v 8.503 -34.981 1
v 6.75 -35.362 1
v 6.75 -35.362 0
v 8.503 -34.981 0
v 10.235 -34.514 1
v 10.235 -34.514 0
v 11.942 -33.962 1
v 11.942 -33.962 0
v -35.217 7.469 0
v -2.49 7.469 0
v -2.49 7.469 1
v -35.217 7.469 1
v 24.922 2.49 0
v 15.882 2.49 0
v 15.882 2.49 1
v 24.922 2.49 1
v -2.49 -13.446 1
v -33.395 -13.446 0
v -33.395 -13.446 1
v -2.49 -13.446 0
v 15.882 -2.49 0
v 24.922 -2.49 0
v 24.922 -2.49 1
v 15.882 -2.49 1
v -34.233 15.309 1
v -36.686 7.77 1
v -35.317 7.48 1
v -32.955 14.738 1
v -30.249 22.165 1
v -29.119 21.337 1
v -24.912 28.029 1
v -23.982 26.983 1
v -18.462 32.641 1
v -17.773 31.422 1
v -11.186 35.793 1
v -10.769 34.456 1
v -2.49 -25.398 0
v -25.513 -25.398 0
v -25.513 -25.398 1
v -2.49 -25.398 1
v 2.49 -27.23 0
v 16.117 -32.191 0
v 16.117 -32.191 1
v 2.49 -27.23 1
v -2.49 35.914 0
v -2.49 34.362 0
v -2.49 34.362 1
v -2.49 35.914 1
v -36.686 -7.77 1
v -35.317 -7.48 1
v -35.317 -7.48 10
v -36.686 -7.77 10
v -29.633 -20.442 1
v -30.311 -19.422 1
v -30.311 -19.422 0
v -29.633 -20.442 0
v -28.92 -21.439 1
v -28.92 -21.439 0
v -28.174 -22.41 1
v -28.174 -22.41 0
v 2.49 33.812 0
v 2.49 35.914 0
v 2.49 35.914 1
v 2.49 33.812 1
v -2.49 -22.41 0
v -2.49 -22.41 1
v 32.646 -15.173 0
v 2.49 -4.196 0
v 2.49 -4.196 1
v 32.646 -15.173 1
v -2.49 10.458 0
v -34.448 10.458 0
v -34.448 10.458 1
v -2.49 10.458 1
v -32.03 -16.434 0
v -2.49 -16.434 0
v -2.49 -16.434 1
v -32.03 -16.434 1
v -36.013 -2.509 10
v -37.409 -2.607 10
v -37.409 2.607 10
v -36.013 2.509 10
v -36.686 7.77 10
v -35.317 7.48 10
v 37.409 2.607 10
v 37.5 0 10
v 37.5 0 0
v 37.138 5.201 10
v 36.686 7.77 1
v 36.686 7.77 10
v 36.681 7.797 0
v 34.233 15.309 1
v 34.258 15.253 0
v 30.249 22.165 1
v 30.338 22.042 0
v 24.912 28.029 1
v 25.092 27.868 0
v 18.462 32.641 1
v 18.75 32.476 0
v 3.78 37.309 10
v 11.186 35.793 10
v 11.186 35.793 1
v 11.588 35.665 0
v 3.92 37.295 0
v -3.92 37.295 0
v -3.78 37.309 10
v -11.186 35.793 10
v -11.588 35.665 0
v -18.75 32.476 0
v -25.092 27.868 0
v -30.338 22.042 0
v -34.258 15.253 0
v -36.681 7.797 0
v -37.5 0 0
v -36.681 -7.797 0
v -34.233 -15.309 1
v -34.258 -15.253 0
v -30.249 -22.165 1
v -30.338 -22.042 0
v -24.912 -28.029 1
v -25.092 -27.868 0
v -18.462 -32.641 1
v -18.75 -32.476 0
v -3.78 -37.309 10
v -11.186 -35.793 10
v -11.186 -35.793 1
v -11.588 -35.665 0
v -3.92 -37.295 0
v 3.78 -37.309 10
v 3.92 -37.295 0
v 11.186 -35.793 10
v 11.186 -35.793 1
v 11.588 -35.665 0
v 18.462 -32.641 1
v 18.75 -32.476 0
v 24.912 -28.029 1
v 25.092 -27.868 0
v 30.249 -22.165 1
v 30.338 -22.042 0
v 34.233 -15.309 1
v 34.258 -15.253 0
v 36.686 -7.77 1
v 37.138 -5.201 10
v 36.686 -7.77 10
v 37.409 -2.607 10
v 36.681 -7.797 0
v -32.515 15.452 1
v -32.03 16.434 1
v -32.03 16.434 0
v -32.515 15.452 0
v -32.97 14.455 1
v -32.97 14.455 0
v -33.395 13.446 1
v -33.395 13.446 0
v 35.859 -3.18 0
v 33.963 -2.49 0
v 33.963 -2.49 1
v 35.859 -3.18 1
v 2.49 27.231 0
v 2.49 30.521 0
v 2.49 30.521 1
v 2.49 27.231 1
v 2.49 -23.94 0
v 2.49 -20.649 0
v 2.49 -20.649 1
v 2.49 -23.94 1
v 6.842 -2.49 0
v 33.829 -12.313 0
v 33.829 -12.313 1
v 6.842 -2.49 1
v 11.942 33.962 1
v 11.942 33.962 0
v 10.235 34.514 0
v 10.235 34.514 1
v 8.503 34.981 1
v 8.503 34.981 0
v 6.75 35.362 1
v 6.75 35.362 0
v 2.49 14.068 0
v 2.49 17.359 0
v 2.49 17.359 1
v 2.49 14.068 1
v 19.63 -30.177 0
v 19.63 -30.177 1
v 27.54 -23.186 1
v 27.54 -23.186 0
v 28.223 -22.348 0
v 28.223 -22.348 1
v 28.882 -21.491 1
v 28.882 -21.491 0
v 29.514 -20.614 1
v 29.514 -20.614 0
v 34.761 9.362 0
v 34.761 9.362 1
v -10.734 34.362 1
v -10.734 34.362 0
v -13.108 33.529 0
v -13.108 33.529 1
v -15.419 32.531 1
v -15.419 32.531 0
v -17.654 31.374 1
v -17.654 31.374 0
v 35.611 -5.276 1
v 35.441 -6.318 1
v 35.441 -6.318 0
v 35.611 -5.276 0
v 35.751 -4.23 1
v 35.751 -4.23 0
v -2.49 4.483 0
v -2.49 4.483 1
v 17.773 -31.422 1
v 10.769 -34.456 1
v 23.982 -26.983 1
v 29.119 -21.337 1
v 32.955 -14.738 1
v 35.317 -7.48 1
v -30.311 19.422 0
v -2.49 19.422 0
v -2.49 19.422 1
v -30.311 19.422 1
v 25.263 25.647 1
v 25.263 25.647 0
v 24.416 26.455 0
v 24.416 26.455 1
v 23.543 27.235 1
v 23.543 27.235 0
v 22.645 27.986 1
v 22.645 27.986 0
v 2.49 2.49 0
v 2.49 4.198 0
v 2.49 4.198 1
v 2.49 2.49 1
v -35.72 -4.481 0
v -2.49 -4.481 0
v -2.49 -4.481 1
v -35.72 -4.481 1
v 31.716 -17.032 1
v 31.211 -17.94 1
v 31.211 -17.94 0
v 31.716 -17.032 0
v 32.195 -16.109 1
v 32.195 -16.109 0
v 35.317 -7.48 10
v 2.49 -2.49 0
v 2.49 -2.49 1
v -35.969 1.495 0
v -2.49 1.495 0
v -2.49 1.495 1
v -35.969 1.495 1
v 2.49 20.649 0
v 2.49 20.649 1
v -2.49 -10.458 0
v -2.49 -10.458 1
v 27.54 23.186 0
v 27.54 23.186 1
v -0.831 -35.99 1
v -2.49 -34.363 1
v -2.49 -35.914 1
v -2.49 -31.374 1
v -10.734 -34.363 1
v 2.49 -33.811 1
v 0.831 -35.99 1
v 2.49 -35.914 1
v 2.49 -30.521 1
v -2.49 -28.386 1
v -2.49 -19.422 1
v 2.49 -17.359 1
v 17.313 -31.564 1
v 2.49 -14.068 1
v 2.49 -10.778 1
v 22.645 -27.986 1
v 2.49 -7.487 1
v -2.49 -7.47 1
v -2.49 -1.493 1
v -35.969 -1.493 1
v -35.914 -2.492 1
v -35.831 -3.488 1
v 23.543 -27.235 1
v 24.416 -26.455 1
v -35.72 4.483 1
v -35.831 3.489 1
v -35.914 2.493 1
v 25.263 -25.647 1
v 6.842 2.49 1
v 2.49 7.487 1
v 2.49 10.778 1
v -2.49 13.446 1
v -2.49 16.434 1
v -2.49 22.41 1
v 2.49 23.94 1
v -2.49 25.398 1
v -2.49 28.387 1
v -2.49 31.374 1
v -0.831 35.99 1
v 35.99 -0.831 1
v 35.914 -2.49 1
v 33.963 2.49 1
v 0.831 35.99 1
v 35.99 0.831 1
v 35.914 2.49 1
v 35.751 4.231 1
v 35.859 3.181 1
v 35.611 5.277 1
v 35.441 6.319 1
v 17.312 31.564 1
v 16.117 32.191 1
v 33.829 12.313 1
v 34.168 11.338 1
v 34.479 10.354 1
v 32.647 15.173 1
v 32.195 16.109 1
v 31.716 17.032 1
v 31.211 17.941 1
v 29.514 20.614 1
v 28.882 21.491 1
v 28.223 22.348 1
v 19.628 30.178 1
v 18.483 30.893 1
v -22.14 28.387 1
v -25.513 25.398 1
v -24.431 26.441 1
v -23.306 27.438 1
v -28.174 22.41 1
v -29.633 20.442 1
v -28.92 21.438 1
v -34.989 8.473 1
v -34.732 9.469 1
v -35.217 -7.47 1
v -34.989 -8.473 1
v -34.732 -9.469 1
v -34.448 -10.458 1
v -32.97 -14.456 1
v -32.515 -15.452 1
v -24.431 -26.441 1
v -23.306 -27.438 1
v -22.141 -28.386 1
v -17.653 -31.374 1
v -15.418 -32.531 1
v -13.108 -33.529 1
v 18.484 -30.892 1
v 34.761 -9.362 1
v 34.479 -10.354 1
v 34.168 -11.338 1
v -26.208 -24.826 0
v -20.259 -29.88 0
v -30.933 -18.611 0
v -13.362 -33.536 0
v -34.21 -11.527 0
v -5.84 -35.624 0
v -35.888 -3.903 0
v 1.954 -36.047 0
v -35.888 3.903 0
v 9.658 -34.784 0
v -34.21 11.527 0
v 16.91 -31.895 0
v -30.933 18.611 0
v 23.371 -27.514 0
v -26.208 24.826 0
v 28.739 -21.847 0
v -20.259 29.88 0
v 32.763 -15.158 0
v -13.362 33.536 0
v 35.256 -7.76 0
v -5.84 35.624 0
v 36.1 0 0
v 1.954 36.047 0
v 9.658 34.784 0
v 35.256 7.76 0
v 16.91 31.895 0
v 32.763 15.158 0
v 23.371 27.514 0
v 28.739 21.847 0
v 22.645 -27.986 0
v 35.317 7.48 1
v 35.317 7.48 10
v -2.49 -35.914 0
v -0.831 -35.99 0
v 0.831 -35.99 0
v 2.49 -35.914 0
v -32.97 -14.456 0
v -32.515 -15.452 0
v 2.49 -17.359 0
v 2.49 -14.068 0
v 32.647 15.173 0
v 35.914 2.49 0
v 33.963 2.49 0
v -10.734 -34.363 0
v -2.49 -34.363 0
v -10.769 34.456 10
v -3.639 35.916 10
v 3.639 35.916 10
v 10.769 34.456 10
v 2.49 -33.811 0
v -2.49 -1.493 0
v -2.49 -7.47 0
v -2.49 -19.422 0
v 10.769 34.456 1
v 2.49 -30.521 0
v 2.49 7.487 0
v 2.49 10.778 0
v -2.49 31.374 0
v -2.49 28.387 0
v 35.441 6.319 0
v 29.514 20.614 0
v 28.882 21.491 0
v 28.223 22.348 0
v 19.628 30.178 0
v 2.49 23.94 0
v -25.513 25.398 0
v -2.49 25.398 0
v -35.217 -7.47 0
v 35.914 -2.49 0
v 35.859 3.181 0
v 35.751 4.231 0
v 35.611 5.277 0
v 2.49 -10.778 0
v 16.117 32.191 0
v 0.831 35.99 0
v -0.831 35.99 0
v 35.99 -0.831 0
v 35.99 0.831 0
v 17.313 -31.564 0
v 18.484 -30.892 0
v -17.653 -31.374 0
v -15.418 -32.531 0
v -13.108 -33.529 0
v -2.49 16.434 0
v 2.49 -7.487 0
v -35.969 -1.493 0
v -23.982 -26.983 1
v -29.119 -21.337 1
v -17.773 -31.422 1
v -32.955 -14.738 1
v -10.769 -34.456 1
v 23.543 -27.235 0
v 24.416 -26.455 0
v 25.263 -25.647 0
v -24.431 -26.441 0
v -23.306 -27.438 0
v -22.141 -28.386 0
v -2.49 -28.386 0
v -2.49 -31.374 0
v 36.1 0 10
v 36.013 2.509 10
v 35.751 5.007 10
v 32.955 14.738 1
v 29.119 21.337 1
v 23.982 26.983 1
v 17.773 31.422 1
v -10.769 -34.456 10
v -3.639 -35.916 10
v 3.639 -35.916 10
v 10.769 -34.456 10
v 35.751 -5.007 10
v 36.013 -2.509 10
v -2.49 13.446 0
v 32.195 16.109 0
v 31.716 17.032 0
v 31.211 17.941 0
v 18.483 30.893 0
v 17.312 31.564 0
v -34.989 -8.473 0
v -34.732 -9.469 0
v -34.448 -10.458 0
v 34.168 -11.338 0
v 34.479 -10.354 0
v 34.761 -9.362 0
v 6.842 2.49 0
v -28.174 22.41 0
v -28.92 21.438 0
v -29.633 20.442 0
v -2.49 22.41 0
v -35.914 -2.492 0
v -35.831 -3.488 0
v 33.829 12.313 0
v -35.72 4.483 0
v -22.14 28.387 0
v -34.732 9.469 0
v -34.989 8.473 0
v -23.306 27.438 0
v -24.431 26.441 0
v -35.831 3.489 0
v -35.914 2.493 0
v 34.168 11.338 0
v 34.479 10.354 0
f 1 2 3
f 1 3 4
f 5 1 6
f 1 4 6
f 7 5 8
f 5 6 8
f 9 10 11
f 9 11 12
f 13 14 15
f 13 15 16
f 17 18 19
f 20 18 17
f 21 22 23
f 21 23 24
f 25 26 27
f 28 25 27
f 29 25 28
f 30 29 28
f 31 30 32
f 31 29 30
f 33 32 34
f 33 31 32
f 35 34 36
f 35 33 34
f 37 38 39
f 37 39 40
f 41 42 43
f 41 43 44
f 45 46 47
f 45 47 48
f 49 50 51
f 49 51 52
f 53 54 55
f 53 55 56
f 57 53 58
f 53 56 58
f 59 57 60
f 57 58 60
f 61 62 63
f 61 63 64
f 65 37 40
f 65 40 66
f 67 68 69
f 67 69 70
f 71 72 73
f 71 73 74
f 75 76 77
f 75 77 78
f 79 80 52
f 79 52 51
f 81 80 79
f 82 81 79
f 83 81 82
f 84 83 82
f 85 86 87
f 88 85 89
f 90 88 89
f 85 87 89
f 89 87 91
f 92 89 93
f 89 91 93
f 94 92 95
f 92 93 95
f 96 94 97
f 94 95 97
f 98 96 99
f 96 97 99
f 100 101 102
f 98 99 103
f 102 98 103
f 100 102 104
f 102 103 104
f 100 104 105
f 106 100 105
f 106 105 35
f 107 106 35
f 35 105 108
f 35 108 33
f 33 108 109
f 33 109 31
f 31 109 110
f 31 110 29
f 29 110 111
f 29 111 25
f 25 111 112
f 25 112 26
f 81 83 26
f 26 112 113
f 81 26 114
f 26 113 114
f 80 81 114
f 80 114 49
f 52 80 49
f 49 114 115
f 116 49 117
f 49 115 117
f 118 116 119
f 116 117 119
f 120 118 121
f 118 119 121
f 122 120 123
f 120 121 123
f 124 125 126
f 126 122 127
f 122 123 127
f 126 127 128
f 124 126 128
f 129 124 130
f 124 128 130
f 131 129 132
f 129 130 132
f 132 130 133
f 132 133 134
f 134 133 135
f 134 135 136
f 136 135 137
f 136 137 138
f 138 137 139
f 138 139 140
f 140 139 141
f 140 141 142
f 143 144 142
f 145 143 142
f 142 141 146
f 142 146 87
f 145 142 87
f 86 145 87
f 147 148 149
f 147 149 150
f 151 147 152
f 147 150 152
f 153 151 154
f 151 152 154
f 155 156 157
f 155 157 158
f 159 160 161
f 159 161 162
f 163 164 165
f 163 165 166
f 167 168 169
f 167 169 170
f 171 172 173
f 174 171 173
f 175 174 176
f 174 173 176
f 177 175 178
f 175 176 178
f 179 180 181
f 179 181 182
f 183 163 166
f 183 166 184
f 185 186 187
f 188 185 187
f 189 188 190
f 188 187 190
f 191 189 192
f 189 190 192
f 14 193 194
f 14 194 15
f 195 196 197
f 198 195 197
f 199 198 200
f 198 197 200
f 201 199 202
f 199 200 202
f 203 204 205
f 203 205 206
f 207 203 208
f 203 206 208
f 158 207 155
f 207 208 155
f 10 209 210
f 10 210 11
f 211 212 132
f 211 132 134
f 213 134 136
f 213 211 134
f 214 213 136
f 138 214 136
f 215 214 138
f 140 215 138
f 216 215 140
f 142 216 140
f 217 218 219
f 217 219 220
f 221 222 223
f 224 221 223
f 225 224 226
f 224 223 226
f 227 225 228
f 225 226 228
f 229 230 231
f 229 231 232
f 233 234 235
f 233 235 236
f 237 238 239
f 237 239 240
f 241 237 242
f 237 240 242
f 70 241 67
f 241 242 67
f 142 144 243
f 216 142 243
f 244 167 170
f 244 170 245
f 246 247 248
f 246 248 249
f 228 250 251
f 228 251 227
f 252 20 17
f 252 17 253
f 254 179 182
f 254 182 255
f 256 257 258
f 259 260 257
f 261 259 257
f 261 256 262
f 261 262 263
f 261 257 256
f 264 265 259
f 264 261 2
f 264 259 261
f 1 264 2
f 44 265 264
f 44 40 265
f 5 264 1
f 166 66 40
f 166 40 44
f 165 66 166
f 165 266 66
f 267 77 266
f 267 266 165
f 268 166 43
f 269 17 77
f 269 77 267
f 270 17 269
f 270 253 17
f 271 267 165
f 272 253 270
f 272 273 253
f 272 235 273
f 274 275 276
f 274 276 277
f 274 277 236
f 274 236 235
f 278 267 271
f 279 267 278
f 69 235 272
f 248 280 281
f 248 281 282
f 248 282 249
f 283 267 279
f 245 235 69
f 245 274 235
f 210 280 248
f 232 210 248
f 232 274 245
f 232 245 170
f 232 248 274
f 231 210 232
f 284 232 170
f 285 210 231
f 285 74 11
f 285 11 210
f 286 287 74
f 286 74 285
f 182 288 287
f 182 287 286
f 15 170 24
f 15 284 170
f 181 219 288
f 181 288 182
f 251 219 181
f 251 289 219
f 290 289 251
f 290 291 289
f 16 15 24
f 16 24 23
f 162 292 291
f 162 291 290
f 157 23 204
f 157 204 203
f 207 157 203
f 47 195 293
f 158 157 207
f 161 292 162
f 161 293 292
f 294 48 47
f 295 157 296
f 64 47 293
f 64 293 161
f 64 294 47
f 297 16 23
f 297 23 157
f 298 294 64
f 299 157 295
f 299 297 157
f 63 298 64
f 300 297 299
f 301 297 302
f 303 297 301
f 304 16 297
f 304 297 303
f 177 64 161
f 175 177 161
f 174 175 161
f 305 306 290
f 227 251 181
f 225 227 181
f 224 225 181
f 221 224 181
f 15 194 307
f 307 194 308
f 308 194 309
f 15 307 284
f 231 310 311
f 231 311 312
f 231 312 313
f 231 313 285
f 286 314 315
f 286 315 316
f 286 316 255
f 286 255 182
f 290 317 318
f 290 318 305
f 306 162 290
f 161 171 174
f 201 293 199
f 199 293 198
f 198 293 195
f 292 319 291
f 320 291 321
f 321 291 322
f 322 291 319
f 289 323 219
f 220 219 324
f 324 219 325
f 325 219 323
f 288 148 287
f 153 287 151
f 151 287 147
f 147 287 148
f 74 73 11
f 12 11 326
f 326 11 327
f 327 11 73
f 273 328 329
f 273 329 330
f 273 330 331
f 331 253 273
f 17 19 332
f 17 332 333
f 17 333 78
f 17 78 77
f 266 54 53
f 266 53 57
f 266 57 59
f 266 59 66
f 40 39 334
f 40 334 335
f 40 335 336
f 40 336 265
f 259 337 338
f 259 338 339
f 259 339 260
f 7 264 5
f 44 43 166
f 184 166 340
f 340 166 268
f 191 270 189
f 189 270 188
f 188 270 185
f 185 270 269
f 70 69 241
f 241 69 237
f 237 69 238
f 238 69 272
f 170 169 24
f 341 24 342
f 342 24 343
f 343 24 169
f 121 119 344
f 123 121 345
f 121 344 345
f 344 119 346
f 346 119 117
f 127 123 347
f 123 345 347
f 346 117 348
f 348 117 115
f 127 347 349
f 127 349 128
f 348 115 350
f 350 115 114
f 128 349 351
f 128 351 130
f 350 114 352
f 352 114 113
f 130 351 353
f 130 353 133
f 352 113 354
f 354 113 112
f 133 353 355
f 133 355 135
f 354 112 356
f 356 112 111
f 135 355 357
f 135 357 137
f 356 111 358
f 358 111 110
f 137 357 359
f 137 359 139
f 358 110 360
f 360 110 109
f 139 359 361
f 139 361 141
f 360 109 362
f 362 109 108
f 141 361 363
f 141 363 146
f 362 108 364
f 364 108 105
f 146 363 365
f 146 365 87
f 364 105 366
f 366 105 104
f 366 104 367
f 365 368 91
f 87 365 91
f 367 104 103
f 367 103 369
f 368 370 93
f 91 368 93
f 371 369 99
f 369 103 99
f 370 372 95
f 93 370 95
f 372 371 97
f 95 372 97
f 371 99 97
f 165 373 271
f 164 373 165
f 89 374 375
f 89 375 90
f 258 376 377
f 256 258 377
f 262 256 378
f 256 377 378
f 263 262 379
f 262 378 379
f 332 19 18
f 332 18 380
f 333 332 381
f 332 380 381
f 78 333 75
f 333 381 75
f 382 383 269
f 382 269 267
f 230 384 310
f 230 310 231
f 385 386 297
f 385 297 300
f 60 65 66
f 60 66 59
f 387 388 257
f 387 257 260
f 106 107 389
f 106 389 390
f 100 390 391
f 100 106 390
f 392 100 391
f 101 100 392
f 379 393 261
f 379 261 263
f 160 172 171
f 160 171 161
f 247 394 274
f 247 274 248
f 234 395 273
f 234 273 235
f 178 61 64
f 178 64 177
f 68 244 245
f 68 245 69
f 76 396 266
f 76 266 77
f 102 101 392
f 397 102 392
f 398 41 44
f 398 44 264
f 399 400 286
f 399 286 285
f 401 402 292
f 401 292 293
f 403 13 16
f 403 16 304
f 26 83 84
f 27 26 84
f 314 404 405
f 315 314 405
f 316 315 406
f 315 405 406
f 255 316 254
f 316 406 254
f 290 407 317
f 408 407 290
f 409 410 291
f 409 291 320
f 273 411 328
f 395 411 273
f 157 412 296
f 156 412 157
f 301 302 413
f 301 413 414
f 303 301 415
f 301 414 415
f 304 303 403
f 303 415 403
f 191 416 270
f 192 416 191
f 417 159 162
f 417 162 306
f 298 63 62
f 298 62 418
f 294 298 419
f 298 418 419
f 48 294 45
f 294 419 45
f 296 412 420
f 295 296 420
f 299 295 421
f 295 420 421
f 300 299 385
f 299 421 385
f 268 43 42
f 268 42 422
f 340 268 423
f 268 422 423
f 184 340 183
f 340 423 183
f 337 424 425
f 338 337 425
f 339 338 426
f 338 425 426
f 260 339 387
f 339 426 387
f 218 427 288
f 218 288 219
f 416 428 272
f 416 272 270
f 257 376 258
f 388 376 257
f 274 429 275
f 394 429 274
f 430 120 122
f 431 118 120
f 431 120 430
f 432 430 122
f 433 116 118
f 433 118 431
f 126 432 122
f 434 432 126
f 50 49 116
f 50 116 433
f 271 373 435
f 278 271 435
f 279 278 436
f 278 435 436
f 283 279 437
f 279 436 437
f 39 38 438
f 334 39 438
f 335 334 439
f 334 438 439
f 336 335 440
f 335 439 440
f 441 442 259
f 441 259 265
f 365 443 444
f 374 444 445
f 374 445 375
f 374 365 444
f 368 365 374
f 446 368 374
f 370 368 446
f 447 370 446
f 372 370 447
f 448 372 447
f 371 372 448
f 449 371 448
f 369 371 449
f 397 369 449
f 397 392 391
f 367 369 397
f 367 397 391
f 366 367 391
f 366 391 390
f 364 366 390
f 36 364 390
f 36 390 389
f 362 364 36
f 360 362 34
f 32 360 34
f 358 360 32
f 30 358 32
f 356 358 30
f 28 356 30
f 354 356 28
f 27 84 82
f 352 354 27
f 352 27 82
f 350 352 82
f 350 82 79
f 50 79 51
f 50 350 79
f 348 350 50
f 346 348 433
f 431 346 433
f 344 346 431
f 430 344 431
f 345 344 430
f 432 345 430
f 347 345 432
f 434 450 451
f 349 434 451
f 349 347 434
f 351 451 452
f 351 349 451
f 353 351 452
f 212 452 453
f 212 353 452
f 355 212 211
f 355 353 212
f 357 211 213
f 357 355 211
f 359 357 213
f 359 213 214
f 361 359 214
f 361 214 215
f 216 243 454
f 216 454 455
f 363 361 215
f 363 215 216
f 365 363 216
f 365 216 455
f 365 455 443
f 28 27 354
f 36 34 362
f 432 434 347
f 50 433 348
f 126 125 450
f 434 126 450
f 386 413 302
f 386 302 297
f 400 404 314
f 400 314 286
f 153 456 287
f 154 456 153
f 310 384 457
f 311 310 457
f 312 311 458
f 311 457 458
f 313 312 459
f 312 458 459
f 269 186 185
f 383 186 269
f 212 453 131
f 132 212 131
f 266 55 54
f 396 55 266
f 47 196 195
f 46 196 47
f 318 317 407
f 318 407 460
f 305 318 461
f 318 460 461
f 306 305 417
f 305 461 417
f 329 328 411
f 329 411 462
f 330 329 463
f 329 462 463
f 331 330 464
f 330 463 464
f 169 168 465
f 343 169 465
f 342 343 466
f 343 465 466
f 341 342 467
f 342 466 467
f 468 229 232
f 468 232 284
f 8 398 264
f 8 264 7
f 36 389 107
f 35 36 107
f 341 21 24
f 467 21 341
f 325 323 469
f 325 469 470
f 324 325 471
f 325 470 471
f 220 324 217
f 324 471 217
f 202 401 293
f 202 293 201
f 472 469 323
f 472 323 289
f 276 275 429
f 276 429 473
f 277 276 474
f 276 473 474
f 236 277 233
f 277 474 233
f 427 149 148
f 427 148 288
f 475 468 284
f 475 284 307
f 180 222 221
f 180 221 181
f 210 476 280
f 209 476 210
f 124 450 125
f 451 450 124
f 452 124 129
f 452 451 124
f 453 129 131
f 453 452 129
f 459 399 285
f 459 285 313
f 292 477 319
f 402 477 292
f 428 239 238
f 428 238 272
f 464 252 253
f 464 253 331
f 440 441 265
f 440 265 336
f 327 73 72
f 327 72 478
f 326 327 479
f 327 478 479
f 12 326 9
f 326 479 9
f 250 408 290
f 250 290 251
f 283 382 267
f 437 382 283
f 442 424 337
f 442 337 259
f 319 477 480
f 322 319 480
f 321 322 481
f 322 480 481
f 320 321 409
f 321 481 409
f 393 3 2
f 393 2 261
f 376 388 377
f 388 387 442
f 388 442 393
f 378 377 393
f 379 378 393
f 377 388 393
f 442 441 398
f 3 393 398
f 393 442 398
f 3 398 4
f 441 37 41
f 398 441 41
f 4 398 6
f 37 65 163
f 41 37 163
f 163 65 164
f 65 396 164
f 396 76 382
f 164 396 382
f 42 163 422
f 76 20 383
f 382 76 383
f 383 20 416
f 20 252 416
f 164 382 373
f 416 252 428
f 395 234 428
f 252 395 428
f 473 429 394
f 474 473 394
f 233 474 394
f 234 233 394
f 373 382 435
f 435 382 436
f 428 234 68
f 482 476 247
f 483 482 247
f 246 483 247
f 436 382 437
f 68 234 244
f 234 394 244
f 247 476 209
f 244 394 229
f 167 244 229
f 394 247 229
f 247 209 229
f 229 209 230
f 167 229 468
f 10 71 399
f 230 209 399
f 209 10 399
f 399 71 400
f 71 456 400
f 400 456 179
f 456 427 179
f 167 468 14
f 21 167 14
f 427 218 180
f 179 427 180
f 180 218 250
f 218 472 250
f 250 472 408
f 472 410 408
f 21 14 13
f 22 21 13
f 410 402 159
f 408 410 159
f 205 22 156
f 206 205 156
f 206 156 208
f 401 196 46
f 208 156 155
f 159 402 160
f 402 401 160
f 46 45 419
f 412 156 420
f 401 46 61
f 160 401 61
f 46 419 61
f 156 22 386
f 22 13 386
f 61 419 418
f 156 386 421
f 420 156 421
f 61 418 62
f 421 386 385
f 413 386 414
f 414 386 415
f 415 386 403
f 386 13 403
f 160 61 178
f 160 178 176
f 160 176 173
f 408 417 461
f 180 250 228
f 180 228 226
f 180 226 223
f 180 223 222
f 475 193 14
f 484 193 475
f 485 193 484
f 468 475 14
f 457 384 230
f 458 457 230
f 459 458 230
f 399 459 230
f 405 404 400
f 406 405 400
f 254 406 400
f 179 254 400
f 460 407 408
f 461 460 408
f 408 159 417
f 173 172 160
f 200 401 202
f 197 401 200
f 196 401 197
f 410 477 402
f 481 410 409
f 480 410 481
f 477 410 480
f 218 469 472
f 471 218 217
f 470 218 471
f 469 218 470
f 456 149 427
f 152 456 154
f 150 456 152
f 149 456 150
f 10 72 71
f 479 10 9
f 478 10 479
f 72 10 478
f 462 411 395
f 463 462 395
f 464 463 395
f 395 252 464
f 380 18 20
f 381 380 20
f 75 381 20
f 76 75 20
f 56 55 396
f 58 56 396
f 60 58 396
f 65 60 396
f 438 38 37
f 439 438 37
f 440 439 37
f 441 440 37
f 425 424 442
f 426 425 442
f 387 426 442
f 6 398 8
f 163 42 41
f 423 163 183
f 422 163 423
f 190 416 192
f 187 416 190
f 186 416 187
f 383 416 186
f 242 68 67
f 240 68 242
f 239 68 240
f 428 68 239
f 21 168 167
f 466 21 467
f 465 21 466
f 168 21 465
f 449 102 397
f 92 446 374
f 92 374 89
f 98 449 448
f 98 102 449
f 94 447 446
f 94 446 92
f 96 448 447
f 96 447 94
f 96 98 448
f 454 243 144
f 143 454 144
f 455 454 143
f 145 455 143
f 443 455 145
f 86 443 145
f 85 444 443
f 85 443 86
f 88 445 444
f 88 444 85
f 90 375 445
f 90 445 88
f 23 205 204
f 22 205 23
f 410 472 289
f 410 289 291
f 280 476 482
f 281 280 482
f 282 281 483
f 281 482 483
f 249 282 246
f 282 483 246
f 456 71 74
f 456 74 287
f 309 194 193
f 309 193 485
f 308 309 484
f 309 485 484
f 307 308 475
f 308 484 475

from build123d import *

# Parameters (mm, degrees)
F1_R     = 37.5
F1_R_2   = 36.1
F2_DEPTH = 10
F3_R     = 36
F4_DEPTH = 1
F5_DEPTH = 1
F7_DEPTH = 9


with BuildPart() as f2:
    # F1 (on Top) → F2 (new body)
    with BuildSketch(Plane.XY):
        Circle(F1_R)
        Circle(F1_R_2, mode=Mode.SUBTRACT)
    extrude(amount=F2_DEPTH)

    # F6 (on face) → F7 (cut)
    with BuildSketch(Plane.XY.offset(10)):
        with BuildLine():
            Line((-36.7841187228, 7.7902894544), (-35.316667178, 7.4795066305))
            ThreePointArc((-35.316667178, 7.4795066305), (-26.7003142326, 24.2961564837), (-10.7688596698, 34.4563733061))
            Line((-10.7688596698, 34.4563733061), (-11.2163192129, 35.8880785682))
            ThreePointArc((-11.2163192129, 35.8880785682), (-27.8097455719, 25.3056920716), (-36.7841187228, 7.7902894544))
        make_face()
        with BuildLine():
            Line((35.316667178, 7.4795066305), (36.7841187228, 7.7902894544))
            ThreePointArc((36.7841187228, 7.7902894544), (27.8097455719, 25.3056920716), (11.2163192129, 35.8880785682))
            Line((11.2163192129, 35.8880785682), (10.7688596698, 34.4563733061))
            ThreePointArc((10.7688596698, 34.4563733061), (26.7003142326, 24.2961564837), (35.316667178, 7.4795066305))
        make_face()
        with BuildLine():
            Line((10.7688596698, -34.4563733061), (11.2163192129, -35.8880785682))
            ThreePointArc((11.2163192129, -35.8880785682), (27.8097455719, -25.3056920716), (36.7841187228, -7.7902894544))
            Line((36.7841187228, -7.7902894544), (35.316667178, -7.4795066305))
            ThreePointArc((35.316667178, -7.4795066305), (26.7003142326, -24.2961564837), (10.7688596698, -34.4563733061))
        make_face()
        with BuildLine():
            Line((-35.316667178, -7.4795066305), (-36.7841187228, -7.7902894544))
            ThreePointArc((-36.7841187228, -7.7902894544), (-27.8097455719, -25.3056920716), (-11.2163192129, -35.8880785682))
            Line((-11.2163192129, -35.8880785682), (-10.7688596698, -34.4563733061))
            ThreePointArc((-10.7688596698, -34.4563733061), (-26.7003142326, -24.2961564837), (-35.316667178, -7.4795066305))
        make_face()
    extrude(amount=-F7_DEPTH, mode=Mode.SUBTRACT)


with BuildPart() as f4:
    # F3 (on Top) → F4 (new body)
    with BuildSketch(Plane.XY):
        Circle(F3_R)
    extrude(amount=F4_DEPTH)

    # F0 (on Top) → F5 (cut)
    with BuildSketch(Plane.XY):
        Polygon((-2.4902910933, -34.3626238759), (-11.0826741202, -34.3626238759), (-10.311164963, -34.6114821287), (-7.0564703338, -35.4167498713), (-3.6922154676, -35.9188919628), (-2.4902910933, -36.009670445), align=None)
        Polygon((7.1067539106, -35.491391156), (2.4903820491, -33.8106669574), (2.4903820491, -36.1048205425), (5.8271119297, -35.7271075774), align=None)
        Polygon((-2.4902910933, -28.3864097812), (-22.3032075436, -28.3864097812), (-21.9489178016, -28.6704298539), (-19.2770242661, -30.5341142514), (-17.8802661697, -31.3744898433), (-2.4902910933, -31.3744898433), align=None)
        Polygon((16.3929284881, -32.2909909103), (2.4903820491, -27.2297667069), (2.4903820491, -30.52097242), (12.2555453479, -34.0756893929), (13.7035754764, -33.5237324744), (15.1834482354, -32.881024059), align=None)
        Polygon((-2.4902910933, -22.4102226717), (-28.2984732461, -22.4102226717), (-27.7919325539, -23.0500436622), (-26.726094947, -24.2767944941), (-25.6602843254, -25.3982757485), (-2.4902910933, -25.3982757485), align=None)
        Polygon((22.877221436, -28.0701422988), (2.4903820491, -20.6488934416), (2.4903820491, -23.9400181989), (19.8775377035, -30.2676885812), (20.7367490209, -29.6967340255), (22.0223277634, -28.7552985597), align=None)
        Polygon((-2.4902910933, -16.4337926948), (-32.1518632989, -16.4337926948), (-31.48424747, -17.687258954), (-30.6497546691, -19.09265234), (-30.4345200753, -19.4221426096), (-2.4902910933, -19.4221426096), align=None)
        Polygon((27.7583188949, -23.2651163443), (2.4903820491, -14.0679931911), (2.4903820491, -17.3591179483), (25.4877774299, -25.7291422675), (25.6105604542, -25.6105419616), (26.7099407642, -24.4612658687), align=None)
        Polygon((-2.4902910933, -10.4576325706), (-34.560191604, -10.4576325706), (-34.1722242324, -11.6843834025), (-33.6012696767, -13.2392752401), (-33.5134056048, -13.4459824855), (-2.4902910933, -13.4459824855), align=None)
        Polygon((31.4199515476, -18.0164793708), (2.4903820491, -7.4870929405), (2.4903820491, -10.7782176978), (29.7260855176, -20.6912603313), (30.5809791902, -19.4073007056), (31.4080780243, -18.0386073005), align=None)
        Polygon((-2.4902910933, -4.4814724464), (-35.8207280066, -4.4814724464), (-35.738773711, -5.1623110626), (-35.4591252536, -6.8340491629), (-35.3229575304, -7.4695525085), (-2.4902910933, -7.4695525085), align=None)
        Polygon((36.1048660204, -2.4902286301), (33.9630443413, -2.4902286301), (36.0374028202, -3.244467208), align=None)
        Polygon((24.9224358124, -2.4902286301), (15.8820971364, -2.4902286301), (34.9512452974, -9.4313823695), (35.0551386257, -9.065192119), (35.4269957851, -7.4592981021), (35.6245280352, -6.3847442497), align=None)
        Polygon((6.8417584603, -2.4902286301), (2.4903820491, -2.4902286301), (2.4903820491, -4.1959681833), (32.8501713912, -15.2467102245), (32.8809346105, -15.1835646691), (33.5237239818, -13.7034220573), (34.0259200439, -12.3843815675), align=None)
        Polygon((-2.4902910933, 1.4949575306), (-36.0696402299, 1.4949575306), (-36.1062052844, -2.69853e-05), (-36.0696402299, -1.4933923843), (-2.4902910933, -1.4933923843), align=None)
        Polygon((36.1048660204, 2.4904445123), (36.0374028202, 3.2454926487), (33.9630443413, 2.4904445123), align=None)
        Polygon((-2.4902910933, 7.4694985379), (-35.3229575304, 7.4694985379), (-35.4591252536, 6.8358841619), (-35.738773711, 5.162257092), (-35.8207280066, 4.4827677399), (-2.4902910933, 4.4827677399), align=None)
        Polygon((35.0551386257, 9.0654080012), (34.9512452974, 9.431328399), (15.8820971364, 2.4904445123), (24.9224358124, 2.4904445123), (35.6245280352, 6.3860395431), (35.4269957851, 7.4595139843), align=None)
        Polygon((-2.4902910933, 13.4456586621), (-33.5134056048, 13.4456586621), (-33.6012696767, 13.2394911224), (-34.1722242324, 11.6845992848), (-34.560191604, 10.4578484528), (-2.4902910933, 10.4578484528), align=None)
        Polygon((32.8809346105, 15.1835106986), (32.8501713912, 15.2466562539), (2.4903820491, 4.1975333295), (2.4903820491, 2.4904445123), (6.8417584603, 2.4904445123), (34.0259200439, 12.384327597), (33.5237239818, 13.7036379396), align=None)
        Polygon((-2.4902910933, 19.4220886391), (-30.4345200753, 19.4220886391), (-30.6497546691, 19.0925983694), (-31.48424747, 17.6872049834), (-32.1518632989, 16.434008577), (-2.4902910933, 16.434008577), align=None)
        Polygon((30.5809791902, 19.4075165879), (29.7260855176, 20.6912063608), (2.4903820491, 10.7781637273), (2.4903820491, 7.48703897), (31.4199515476, 18.0166952531), (31.4080780243, 18.0382834771), align=None)
        Polygon((-2.4902910933, 25.3982487633), (-25.6602843254, 25.3982487633), (-26.726094947, 24.2767405236), (-27.7919325539, 23.0497198388), (-28.2984732461, 22.4098988484), (-2.4902910933, 22.4098988484), align=None)
        Polygon((25.6105604542, 25.6103530646), (25.4877774299, 25.7290882969), (2.4903820491, 17.3593338306), (2.4903820491, 14.0679392205), (27.7583188949, 23.2653322266), (26.7099407642, 24.4626691033), align=None)
        Polygon((20.7367490209, 29.6967340255), (19.8775377035, 30.2690918158), (2.4903820491, 23.9399642283), (2.4903820491, 20.648839471), (22.877221436, 28.0700613429), (22.0223277634, 28.7552176039), align=None)
        Polygon((-2.4902910933, 31.3744088874), (-17.8802661697, 31.3744088874), (-19.2770242661, 30.5340872661), (-21.9489178016, 28.6702139717), (-22.3032075436, 28.3865986782), (-2.4902910933, 28.3865986782), align=None)
        Polygon((13.7035754764, 33.523786445), (12.2555453479, 34.0756354224), (2.4903820491, 30.5208644788), (2.4903820491, 27.2313588384), (16.3929284881, 32.2910988514), (15.1834482354, 32.8809970737), align=None)
        Polygon((-2.4902910933, 34.3624889495), (-2.4902910933, 36.011019709), (-3.6922154676, 35.9187300511), (-7.0564703338, 35.416533989), (-10.311164963, 34.6115630846), (-11.0826741202, 34.3624889495), align=None)
        Polygon((5.8271119297, 35.7271345626), (2.4903820491, 36.1062777476), (2.4903820491, 33.8119892361), (7.1067539106, 35.4915530676), align=None)
    extrude(amount=F5_DEPTH, mode=Mode.SUBTRACT)


solid = Compound([f2.part, f4.part])
